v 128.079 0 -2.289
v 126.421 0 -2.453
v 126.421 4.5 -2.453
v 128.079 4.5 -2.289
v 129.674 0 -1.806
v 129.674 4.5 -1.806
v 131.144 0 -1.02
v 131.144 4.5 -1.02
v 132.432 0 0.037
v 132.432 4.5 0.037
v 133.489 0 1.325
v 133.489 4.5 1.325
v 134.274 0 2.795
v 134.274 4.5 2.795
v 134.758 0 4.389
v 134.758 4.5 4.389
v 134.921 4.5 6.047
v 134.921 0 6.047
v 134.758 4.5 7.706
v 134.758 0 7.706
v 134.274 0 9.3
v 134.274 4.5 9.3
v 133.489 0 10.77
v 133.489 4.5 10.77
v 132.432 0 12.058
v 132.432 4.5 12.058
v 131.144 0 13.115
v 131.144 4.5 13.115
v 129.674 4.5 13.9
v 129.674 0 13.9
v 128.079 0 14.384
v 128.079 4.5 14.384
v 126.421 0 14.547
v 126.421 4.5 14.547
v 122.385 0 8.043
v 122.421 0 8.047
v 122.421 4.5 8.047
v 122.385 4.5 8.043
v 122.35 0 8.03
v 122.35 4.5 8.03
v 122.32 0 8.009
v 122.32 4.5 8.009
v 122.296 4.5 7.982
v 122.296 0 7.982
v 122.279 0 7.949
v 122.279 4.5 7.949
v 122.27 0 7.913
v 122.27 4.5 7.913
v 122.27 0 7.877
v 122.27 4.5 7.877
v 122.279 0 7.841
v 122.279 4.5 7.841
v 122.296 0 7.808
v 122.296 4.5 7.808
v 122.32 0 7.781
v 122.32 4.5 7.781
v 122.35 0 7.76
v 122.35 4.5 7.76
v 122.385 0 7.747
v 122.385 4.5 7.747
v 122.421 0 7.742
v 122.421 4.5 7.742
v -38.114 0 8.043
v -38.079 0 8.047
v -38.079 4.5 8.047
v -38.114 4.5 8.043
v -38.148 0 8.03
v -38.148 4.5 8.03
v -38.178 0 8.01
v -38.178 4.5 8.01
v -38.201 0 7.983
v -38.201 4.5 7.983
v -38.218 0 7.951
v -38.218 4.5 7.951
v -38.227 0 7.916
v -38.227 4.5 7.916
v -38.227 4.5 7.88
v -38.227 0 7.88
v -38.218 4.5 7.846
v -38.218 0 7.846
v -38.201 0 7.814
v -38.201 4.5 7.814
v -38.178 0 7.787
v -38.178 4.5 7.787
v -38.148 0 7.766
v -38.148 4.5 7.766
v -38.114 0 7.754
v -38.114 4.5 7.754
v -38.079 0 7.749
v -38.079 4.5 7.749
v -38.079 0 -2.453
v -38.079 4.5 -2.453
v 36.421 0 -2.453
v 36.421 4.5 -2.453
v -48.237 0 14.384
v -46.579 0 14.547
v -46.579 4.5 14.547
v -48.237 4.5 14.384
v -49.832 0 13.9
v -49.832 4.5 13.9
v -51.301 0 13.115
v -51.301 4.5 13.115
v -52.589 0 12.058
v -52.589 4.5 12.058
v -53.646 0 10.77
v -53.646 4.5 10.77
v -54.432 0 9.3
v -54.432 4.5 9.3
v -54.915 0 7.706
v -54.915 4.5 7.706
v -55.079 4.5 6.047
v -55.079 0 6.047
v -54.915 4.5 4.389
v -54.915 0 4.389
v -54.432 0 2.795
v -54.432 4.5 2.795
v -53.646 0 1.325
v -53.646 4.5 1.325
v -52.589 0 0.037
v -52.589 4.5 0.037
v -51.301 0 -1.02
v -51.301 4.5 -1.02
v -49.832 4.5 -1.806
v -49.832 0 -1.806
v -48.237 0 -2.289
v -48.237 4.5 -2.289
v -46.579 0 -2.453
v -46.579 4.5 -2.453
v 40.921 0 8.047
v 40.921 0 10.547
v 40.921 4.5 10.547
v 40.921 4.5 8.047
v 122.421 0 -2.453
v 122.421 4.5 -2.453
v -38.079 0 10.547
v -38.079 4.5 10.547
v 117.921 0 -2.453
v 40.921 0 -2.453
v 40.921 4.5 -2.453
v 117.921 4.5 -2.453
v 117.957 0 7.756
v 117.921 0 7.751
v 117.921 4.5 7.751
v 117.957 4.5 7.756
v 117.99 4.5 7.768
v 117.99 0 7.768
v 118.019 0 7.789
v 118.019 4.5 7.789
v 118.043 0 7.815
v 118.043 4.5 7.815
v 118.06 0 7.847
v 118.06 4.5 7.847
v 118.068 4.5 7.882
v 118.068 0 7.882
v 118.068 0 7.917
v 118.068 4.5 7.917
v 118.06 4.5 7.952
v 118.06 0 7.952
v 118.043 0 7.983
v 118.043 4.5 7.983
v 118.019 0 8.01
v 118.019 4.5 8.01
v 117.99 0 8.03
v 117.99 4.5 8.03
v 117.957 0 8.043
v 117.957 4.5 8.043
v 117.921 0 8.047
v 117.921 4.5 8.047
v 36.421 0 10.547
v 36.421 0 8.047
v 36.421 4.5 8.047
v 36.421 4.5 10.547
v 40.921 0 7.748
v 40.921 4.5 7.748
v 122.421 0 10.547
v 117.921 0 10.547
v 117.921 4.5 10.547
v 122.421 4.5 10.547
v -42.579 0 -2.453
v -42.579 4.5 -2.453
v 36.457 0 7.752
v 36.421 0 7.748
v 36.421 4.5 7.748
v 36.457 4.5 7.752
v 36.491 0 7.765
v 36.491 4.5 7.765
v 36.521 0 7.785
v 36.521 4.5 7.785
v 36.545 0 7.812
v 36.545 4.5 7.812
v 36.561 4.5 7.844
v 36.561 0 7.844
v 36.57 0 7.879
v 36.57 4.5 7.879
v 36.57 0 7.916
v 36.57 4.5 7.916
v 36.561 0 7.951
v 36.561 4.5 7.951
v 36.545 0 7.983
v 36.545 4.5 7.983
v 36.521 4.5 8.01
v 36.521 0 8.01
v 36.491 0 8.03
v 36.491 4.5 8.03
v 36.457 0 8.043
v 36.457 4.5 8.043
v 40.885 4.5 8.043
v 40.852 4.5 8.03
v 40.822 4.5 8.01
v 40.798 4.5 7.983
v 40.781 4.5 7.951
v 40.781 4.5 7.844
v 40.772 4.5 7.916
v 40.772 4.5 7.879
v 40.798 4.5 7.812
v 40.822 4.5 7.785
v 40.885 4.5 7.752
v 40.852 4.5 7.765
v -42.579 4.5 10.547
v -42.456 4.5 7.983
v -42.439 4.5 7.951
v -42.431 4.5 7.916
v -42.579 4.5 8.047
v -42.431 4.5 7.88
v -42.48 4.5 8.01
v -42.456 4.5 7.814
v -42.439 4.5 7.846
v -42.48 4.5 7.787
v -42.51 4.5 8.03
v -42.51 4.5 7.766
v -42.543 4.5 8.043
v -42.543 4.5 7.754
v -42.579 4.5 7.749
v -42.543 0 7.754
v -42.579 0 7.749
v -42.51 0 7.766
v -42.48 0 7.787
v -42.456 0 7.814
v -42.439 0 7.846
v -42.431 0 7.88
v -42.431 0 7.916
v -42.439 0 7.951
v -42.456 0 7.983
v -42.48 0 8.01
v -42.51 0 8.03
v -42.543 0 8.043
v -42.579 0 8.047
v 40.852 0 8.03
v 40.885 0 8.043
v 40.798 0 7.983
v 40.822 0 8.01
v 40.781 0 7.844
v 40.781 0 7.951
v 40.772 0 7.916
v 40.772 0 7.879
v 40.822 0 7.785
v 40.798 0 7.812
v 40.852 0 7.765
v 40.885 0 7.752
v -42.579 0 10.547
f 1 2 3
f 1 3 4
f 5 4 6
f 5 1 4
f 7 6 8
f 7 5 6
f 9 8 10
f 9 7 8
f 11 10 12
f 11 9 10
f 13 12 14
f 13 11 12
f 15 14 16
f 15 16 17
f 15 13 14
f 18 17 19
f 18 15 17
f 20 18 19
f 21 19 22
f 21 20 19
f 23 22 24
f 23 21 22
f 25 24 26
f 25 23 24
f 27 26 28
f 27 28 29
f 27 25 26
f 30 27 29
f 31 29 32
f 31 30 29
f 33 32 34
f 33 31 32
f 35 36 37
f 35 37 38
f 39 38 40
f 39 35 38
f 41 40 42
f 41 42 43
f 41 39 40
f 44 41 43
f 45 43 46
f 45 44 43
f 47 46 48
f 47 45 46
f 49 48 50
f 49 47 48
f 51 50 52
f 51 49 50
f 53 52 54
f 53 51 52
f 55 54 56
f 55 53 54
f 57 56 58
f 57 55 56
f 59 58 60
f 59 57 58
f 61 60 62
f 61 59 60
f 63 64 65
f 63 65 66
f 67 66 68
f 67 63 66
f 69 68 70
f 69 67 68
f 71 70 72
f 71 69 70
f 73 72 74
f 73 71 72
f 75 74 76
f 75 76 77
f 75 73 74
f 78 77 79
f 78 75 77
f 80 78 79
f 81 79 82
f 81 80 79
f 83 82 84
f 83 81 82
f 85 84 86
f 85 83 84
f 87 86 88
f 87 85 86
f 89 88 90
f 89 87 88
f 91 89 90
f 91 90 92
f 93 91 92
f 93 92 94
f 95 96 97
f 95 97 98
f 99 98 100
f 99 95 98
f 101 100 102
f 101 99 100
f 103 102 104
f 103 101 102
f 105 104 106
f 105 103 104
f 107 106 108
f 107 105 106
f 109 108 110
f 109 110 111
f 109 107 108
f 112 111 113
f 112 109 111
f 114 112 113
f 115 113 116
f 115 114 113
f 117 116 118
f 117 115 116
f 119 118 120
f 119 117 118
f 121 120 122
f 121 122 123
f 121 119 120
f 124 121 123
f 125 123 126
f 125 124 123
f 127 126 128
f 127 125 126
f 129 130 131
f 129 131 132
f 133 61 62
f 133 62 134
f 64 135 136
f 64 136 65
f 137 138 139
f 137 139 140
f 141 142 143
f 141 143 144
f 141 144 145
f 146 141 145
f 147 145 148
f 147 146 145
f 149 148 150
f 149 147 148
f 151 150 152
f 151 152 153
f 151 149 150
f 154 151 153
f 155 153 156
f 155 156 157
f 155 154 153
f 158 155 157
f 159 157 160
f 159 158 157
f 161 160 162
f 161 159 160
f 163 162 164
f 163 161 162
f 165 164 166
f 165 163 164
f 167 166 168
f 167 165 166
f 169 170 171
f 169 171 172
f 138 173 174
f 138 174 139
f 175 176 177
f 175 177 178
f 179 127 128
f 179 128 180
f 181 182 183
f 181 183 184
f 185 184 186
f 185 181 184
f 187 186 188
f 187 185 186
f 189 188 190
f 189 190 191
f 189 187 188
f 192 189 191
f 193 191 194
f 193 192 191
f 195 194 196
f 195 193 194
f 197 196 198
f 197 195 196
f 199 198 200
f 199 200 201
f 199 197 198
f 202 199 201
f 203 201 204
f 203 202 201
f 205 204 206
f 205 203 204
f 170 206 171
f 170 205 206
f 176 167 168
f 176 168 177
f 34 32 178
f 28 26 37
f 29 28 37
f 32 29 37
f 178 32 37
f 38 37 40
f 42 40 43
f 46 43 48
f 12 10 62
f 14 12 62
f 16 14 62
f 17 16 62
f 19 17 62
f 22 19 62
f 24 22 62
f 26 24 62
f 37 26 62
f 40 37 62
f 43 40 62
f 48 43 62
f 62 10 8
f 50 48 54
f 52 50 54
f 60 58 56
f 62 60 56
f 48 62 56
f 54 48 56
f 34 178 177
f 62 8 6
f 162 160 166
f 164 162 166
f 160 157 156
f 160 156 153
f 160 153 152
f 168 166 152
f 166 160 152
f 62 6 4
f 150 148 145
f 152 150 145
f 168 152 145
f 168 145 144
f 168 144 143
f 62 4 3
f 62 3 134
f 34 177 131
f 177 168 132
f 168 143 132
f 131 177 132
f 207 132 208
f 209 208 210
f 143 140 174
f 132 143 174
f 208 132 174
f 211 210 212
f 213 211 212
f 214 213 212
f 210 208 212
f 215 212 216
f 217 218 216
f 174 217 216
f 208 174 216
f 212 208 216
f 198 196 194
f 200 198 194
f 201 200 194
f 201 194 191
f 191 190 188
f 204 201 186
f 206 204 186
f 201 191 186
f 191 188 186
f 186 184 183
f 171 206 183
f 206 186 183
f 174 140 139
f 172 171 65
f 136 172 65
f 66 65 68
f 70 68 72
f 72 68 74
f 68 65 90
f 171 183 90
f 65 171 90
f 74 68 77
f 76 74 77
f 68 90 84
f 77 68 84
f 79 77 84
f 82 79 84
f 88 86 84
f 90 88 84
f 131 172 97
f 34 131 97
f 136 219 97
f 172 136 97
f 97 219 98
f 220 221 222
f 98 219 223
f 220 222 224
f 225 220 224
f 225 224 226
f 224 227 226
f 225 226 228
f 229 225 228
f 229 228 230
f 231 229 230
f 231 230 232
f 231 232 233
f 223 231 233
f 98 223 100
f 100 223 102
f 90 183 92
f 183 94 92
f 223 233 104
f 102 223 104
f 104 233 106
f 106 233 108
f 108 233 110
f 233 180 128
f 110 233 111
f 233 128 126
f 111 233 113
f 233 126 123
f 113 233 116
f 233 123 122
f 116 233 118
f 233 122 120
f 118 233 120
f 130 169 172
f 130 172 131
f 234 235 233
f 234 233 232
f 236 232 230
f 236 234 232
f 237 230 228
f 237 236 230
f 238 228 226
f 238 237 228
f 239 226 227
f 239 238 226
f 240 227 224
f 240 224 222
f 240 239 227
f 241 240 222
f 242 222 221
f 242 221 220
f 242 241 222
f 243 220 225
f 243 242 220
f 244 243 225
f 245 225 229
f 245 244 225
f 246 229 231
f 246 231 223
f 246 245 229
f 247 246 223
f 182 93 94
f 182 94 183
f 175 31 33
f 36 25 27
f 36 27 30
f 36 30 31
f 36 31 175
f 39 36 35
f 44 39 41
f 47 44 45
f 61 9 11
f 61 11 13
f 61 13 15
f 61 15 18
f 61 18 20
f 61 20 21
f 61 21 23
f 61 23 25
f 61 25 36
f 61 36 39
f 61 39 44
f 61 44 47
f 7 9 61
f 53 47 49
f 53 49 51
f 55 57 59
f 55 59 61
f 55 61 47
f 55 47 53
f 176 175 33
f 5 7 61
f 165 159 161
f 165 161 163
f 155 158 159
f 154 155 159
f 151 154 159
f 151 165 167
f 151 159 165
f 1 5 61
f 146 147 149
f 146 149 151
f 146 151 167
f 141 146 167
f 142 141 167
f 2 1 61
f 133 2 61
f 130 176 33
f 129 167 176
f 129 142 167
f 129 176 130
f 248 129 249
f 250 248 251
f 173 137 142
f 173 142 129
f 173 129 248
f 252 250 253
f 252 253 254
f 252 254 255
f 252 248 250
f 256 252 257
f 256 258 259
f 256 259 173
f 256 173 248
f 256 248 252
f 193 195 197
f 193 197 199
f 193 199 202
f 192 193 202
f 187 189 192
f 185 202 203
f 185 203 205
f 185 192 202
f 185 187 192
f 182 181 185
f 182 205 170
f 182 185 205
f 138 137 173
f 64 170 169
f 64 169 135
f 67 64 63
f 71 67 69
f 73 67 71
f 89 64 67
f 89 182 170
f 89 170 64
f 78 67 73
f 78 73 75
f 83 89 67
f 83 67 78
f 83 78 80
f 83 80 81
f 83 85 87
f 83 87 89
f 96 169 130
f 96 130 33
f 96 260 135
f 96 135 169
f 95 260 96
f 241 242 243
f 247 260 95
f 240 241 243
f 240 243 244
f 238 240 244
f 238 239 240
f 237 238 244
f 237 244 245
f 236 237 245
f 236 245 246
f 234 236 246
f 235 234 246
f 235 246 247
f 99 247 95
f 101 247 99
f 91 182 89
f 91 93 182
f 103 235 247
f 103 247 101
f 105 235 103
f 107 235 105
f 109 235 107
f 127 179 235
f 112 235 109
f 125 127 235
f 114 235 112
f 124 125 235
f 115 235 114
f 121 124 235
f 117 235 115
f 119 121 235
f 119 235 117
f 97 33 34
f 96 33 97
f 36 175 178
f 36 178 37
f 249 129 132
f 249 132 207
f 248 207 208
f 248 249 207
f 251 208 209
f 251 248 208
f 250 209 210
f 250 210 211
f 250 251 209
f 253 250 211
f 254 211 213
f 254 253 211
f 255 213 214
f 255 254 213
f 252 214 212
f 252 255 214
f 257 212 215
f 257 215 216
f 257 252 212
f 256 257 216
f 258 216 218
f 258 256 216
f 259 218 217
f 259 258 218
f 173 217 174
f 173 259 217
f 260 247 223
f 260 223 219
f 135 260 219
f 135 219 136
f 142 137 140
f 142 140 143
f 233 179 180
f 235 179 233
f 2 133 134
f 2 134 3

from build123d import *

# Parameters (mm, degrees)
BOSS_EXTRUDE1_DEPTH = 4.5


with BuildPart() as part:
    # Sketch1 → Boss-Extrude1 (new body)
    with BuildSketch(Plane(origin=(0, 0, 0), x_dir=(1, 0, 0), z_dir=(0, 1, 0))):
        with BuildLine():
            Line((40.921196651, 2.452604877), (83.421196651, 2.452604877))
            Line((83.421196651, 2.452604877), (87.921196651, 2.452604877))
            Line((87.921196651, 2.452604877), (117.921196651, 2.452604877))
            Line((117.921196651, 2.452604877), (117.921196651, -7.751372429))
            ThreePointArc((117.921196651, -7.751372429), (118.069207998, -7.899383776), (117.921196651, -8.047395123))
            Line((117.921196651, -8.047395123), (117.921196651, -10.547395123))
            Line((117.921196651, -10.547395123), (122.421196651, -10.547395123))
            Line((122.421196651, -10.547395123), (122.421196651, -8.047395123))
            ThreePointArc((122.421196651, -8.047395123), (122.268740731, -7.894939202), (122.421196651, -7.742483282))
            Line((122.421196651, -7.742483282), (122.421196651, 2.452604877))
            Line((122.421196651, 2.452604877), (126.421196651, 2.452604877))
            ThreePointArc((126.421196651, 2.452604877), (134.921196651, -6.047395123), (126.421196651, -14.547395123))
            Line((126.421196651, -14.547395123), (-46.578803349, -14.547395123))
            ThreePointArc((-46.578803349, -14.547395123), (-55.078803349, -6.047395123), (-46.578803349, 2.452604877))
            Line((-46.578803349, 2.452604877), (-42.578803349, 2.452604877))
            Line((-42.578803349, 2.452604877), (-42.578803349, -7.749399248))
            ThreePointArc((-42.578803349, -7.749399248), (-42.429805412, -7.898397185), (-42.578803349, -8.047395123))
            Line((-42.578803349, -8.047395123), (-42.578803349, -10.547395123))
            Line((-42.578803349, -10.547395123), (-38.078803349, -10.547395123))
            Line((-38.078803349, -10.547395123), (-38.078803349, -8.047395123))
            ThreePointArc((-38.078803349, -8.047395123), (-38.227801286, -7.898397185), (-38.078803349, -7.749399248))
            Line((-38.078803349, -7.749399248), (-38.078803349, 2.452604877))
            Line((-38.078803349, 2.452604877), (-8.078803349, 2.452604877))
            Line((-8.078803349, 2.452604877), (-3.578803349, 2.452604877))
            Line((-3.578803349, 2.452604877), (36.421196651, 2.452604877))
            Line((36.421196651, 2.452604877), (36.421196651, -7.747669694))
            ThreePointArc((36.421196651, -7.747669694), (36.571059365, -7.897532409), (36.421196651, -8.047395123))
            Line((36.421196651, -8.047395123), (36.421196651, -10.547395123))
            Line((36.421196651, -10.547395123), (40.921196651, -10.547395123))
            Line((40.921196651, -10.547395123), (40.921196651, -8.047395123))
            ThreePointArc((40.921196651, -8.047395123), (40.771333937, -7.897532409), (40.921196651, -7.747669694))
            Line((40.921196651, -7.747669694), (40.921196651, 2.452604877))
        make_face()
    extrude(amount=BOSS_EXTRUDE1_DEPTH)


solid = part.part
